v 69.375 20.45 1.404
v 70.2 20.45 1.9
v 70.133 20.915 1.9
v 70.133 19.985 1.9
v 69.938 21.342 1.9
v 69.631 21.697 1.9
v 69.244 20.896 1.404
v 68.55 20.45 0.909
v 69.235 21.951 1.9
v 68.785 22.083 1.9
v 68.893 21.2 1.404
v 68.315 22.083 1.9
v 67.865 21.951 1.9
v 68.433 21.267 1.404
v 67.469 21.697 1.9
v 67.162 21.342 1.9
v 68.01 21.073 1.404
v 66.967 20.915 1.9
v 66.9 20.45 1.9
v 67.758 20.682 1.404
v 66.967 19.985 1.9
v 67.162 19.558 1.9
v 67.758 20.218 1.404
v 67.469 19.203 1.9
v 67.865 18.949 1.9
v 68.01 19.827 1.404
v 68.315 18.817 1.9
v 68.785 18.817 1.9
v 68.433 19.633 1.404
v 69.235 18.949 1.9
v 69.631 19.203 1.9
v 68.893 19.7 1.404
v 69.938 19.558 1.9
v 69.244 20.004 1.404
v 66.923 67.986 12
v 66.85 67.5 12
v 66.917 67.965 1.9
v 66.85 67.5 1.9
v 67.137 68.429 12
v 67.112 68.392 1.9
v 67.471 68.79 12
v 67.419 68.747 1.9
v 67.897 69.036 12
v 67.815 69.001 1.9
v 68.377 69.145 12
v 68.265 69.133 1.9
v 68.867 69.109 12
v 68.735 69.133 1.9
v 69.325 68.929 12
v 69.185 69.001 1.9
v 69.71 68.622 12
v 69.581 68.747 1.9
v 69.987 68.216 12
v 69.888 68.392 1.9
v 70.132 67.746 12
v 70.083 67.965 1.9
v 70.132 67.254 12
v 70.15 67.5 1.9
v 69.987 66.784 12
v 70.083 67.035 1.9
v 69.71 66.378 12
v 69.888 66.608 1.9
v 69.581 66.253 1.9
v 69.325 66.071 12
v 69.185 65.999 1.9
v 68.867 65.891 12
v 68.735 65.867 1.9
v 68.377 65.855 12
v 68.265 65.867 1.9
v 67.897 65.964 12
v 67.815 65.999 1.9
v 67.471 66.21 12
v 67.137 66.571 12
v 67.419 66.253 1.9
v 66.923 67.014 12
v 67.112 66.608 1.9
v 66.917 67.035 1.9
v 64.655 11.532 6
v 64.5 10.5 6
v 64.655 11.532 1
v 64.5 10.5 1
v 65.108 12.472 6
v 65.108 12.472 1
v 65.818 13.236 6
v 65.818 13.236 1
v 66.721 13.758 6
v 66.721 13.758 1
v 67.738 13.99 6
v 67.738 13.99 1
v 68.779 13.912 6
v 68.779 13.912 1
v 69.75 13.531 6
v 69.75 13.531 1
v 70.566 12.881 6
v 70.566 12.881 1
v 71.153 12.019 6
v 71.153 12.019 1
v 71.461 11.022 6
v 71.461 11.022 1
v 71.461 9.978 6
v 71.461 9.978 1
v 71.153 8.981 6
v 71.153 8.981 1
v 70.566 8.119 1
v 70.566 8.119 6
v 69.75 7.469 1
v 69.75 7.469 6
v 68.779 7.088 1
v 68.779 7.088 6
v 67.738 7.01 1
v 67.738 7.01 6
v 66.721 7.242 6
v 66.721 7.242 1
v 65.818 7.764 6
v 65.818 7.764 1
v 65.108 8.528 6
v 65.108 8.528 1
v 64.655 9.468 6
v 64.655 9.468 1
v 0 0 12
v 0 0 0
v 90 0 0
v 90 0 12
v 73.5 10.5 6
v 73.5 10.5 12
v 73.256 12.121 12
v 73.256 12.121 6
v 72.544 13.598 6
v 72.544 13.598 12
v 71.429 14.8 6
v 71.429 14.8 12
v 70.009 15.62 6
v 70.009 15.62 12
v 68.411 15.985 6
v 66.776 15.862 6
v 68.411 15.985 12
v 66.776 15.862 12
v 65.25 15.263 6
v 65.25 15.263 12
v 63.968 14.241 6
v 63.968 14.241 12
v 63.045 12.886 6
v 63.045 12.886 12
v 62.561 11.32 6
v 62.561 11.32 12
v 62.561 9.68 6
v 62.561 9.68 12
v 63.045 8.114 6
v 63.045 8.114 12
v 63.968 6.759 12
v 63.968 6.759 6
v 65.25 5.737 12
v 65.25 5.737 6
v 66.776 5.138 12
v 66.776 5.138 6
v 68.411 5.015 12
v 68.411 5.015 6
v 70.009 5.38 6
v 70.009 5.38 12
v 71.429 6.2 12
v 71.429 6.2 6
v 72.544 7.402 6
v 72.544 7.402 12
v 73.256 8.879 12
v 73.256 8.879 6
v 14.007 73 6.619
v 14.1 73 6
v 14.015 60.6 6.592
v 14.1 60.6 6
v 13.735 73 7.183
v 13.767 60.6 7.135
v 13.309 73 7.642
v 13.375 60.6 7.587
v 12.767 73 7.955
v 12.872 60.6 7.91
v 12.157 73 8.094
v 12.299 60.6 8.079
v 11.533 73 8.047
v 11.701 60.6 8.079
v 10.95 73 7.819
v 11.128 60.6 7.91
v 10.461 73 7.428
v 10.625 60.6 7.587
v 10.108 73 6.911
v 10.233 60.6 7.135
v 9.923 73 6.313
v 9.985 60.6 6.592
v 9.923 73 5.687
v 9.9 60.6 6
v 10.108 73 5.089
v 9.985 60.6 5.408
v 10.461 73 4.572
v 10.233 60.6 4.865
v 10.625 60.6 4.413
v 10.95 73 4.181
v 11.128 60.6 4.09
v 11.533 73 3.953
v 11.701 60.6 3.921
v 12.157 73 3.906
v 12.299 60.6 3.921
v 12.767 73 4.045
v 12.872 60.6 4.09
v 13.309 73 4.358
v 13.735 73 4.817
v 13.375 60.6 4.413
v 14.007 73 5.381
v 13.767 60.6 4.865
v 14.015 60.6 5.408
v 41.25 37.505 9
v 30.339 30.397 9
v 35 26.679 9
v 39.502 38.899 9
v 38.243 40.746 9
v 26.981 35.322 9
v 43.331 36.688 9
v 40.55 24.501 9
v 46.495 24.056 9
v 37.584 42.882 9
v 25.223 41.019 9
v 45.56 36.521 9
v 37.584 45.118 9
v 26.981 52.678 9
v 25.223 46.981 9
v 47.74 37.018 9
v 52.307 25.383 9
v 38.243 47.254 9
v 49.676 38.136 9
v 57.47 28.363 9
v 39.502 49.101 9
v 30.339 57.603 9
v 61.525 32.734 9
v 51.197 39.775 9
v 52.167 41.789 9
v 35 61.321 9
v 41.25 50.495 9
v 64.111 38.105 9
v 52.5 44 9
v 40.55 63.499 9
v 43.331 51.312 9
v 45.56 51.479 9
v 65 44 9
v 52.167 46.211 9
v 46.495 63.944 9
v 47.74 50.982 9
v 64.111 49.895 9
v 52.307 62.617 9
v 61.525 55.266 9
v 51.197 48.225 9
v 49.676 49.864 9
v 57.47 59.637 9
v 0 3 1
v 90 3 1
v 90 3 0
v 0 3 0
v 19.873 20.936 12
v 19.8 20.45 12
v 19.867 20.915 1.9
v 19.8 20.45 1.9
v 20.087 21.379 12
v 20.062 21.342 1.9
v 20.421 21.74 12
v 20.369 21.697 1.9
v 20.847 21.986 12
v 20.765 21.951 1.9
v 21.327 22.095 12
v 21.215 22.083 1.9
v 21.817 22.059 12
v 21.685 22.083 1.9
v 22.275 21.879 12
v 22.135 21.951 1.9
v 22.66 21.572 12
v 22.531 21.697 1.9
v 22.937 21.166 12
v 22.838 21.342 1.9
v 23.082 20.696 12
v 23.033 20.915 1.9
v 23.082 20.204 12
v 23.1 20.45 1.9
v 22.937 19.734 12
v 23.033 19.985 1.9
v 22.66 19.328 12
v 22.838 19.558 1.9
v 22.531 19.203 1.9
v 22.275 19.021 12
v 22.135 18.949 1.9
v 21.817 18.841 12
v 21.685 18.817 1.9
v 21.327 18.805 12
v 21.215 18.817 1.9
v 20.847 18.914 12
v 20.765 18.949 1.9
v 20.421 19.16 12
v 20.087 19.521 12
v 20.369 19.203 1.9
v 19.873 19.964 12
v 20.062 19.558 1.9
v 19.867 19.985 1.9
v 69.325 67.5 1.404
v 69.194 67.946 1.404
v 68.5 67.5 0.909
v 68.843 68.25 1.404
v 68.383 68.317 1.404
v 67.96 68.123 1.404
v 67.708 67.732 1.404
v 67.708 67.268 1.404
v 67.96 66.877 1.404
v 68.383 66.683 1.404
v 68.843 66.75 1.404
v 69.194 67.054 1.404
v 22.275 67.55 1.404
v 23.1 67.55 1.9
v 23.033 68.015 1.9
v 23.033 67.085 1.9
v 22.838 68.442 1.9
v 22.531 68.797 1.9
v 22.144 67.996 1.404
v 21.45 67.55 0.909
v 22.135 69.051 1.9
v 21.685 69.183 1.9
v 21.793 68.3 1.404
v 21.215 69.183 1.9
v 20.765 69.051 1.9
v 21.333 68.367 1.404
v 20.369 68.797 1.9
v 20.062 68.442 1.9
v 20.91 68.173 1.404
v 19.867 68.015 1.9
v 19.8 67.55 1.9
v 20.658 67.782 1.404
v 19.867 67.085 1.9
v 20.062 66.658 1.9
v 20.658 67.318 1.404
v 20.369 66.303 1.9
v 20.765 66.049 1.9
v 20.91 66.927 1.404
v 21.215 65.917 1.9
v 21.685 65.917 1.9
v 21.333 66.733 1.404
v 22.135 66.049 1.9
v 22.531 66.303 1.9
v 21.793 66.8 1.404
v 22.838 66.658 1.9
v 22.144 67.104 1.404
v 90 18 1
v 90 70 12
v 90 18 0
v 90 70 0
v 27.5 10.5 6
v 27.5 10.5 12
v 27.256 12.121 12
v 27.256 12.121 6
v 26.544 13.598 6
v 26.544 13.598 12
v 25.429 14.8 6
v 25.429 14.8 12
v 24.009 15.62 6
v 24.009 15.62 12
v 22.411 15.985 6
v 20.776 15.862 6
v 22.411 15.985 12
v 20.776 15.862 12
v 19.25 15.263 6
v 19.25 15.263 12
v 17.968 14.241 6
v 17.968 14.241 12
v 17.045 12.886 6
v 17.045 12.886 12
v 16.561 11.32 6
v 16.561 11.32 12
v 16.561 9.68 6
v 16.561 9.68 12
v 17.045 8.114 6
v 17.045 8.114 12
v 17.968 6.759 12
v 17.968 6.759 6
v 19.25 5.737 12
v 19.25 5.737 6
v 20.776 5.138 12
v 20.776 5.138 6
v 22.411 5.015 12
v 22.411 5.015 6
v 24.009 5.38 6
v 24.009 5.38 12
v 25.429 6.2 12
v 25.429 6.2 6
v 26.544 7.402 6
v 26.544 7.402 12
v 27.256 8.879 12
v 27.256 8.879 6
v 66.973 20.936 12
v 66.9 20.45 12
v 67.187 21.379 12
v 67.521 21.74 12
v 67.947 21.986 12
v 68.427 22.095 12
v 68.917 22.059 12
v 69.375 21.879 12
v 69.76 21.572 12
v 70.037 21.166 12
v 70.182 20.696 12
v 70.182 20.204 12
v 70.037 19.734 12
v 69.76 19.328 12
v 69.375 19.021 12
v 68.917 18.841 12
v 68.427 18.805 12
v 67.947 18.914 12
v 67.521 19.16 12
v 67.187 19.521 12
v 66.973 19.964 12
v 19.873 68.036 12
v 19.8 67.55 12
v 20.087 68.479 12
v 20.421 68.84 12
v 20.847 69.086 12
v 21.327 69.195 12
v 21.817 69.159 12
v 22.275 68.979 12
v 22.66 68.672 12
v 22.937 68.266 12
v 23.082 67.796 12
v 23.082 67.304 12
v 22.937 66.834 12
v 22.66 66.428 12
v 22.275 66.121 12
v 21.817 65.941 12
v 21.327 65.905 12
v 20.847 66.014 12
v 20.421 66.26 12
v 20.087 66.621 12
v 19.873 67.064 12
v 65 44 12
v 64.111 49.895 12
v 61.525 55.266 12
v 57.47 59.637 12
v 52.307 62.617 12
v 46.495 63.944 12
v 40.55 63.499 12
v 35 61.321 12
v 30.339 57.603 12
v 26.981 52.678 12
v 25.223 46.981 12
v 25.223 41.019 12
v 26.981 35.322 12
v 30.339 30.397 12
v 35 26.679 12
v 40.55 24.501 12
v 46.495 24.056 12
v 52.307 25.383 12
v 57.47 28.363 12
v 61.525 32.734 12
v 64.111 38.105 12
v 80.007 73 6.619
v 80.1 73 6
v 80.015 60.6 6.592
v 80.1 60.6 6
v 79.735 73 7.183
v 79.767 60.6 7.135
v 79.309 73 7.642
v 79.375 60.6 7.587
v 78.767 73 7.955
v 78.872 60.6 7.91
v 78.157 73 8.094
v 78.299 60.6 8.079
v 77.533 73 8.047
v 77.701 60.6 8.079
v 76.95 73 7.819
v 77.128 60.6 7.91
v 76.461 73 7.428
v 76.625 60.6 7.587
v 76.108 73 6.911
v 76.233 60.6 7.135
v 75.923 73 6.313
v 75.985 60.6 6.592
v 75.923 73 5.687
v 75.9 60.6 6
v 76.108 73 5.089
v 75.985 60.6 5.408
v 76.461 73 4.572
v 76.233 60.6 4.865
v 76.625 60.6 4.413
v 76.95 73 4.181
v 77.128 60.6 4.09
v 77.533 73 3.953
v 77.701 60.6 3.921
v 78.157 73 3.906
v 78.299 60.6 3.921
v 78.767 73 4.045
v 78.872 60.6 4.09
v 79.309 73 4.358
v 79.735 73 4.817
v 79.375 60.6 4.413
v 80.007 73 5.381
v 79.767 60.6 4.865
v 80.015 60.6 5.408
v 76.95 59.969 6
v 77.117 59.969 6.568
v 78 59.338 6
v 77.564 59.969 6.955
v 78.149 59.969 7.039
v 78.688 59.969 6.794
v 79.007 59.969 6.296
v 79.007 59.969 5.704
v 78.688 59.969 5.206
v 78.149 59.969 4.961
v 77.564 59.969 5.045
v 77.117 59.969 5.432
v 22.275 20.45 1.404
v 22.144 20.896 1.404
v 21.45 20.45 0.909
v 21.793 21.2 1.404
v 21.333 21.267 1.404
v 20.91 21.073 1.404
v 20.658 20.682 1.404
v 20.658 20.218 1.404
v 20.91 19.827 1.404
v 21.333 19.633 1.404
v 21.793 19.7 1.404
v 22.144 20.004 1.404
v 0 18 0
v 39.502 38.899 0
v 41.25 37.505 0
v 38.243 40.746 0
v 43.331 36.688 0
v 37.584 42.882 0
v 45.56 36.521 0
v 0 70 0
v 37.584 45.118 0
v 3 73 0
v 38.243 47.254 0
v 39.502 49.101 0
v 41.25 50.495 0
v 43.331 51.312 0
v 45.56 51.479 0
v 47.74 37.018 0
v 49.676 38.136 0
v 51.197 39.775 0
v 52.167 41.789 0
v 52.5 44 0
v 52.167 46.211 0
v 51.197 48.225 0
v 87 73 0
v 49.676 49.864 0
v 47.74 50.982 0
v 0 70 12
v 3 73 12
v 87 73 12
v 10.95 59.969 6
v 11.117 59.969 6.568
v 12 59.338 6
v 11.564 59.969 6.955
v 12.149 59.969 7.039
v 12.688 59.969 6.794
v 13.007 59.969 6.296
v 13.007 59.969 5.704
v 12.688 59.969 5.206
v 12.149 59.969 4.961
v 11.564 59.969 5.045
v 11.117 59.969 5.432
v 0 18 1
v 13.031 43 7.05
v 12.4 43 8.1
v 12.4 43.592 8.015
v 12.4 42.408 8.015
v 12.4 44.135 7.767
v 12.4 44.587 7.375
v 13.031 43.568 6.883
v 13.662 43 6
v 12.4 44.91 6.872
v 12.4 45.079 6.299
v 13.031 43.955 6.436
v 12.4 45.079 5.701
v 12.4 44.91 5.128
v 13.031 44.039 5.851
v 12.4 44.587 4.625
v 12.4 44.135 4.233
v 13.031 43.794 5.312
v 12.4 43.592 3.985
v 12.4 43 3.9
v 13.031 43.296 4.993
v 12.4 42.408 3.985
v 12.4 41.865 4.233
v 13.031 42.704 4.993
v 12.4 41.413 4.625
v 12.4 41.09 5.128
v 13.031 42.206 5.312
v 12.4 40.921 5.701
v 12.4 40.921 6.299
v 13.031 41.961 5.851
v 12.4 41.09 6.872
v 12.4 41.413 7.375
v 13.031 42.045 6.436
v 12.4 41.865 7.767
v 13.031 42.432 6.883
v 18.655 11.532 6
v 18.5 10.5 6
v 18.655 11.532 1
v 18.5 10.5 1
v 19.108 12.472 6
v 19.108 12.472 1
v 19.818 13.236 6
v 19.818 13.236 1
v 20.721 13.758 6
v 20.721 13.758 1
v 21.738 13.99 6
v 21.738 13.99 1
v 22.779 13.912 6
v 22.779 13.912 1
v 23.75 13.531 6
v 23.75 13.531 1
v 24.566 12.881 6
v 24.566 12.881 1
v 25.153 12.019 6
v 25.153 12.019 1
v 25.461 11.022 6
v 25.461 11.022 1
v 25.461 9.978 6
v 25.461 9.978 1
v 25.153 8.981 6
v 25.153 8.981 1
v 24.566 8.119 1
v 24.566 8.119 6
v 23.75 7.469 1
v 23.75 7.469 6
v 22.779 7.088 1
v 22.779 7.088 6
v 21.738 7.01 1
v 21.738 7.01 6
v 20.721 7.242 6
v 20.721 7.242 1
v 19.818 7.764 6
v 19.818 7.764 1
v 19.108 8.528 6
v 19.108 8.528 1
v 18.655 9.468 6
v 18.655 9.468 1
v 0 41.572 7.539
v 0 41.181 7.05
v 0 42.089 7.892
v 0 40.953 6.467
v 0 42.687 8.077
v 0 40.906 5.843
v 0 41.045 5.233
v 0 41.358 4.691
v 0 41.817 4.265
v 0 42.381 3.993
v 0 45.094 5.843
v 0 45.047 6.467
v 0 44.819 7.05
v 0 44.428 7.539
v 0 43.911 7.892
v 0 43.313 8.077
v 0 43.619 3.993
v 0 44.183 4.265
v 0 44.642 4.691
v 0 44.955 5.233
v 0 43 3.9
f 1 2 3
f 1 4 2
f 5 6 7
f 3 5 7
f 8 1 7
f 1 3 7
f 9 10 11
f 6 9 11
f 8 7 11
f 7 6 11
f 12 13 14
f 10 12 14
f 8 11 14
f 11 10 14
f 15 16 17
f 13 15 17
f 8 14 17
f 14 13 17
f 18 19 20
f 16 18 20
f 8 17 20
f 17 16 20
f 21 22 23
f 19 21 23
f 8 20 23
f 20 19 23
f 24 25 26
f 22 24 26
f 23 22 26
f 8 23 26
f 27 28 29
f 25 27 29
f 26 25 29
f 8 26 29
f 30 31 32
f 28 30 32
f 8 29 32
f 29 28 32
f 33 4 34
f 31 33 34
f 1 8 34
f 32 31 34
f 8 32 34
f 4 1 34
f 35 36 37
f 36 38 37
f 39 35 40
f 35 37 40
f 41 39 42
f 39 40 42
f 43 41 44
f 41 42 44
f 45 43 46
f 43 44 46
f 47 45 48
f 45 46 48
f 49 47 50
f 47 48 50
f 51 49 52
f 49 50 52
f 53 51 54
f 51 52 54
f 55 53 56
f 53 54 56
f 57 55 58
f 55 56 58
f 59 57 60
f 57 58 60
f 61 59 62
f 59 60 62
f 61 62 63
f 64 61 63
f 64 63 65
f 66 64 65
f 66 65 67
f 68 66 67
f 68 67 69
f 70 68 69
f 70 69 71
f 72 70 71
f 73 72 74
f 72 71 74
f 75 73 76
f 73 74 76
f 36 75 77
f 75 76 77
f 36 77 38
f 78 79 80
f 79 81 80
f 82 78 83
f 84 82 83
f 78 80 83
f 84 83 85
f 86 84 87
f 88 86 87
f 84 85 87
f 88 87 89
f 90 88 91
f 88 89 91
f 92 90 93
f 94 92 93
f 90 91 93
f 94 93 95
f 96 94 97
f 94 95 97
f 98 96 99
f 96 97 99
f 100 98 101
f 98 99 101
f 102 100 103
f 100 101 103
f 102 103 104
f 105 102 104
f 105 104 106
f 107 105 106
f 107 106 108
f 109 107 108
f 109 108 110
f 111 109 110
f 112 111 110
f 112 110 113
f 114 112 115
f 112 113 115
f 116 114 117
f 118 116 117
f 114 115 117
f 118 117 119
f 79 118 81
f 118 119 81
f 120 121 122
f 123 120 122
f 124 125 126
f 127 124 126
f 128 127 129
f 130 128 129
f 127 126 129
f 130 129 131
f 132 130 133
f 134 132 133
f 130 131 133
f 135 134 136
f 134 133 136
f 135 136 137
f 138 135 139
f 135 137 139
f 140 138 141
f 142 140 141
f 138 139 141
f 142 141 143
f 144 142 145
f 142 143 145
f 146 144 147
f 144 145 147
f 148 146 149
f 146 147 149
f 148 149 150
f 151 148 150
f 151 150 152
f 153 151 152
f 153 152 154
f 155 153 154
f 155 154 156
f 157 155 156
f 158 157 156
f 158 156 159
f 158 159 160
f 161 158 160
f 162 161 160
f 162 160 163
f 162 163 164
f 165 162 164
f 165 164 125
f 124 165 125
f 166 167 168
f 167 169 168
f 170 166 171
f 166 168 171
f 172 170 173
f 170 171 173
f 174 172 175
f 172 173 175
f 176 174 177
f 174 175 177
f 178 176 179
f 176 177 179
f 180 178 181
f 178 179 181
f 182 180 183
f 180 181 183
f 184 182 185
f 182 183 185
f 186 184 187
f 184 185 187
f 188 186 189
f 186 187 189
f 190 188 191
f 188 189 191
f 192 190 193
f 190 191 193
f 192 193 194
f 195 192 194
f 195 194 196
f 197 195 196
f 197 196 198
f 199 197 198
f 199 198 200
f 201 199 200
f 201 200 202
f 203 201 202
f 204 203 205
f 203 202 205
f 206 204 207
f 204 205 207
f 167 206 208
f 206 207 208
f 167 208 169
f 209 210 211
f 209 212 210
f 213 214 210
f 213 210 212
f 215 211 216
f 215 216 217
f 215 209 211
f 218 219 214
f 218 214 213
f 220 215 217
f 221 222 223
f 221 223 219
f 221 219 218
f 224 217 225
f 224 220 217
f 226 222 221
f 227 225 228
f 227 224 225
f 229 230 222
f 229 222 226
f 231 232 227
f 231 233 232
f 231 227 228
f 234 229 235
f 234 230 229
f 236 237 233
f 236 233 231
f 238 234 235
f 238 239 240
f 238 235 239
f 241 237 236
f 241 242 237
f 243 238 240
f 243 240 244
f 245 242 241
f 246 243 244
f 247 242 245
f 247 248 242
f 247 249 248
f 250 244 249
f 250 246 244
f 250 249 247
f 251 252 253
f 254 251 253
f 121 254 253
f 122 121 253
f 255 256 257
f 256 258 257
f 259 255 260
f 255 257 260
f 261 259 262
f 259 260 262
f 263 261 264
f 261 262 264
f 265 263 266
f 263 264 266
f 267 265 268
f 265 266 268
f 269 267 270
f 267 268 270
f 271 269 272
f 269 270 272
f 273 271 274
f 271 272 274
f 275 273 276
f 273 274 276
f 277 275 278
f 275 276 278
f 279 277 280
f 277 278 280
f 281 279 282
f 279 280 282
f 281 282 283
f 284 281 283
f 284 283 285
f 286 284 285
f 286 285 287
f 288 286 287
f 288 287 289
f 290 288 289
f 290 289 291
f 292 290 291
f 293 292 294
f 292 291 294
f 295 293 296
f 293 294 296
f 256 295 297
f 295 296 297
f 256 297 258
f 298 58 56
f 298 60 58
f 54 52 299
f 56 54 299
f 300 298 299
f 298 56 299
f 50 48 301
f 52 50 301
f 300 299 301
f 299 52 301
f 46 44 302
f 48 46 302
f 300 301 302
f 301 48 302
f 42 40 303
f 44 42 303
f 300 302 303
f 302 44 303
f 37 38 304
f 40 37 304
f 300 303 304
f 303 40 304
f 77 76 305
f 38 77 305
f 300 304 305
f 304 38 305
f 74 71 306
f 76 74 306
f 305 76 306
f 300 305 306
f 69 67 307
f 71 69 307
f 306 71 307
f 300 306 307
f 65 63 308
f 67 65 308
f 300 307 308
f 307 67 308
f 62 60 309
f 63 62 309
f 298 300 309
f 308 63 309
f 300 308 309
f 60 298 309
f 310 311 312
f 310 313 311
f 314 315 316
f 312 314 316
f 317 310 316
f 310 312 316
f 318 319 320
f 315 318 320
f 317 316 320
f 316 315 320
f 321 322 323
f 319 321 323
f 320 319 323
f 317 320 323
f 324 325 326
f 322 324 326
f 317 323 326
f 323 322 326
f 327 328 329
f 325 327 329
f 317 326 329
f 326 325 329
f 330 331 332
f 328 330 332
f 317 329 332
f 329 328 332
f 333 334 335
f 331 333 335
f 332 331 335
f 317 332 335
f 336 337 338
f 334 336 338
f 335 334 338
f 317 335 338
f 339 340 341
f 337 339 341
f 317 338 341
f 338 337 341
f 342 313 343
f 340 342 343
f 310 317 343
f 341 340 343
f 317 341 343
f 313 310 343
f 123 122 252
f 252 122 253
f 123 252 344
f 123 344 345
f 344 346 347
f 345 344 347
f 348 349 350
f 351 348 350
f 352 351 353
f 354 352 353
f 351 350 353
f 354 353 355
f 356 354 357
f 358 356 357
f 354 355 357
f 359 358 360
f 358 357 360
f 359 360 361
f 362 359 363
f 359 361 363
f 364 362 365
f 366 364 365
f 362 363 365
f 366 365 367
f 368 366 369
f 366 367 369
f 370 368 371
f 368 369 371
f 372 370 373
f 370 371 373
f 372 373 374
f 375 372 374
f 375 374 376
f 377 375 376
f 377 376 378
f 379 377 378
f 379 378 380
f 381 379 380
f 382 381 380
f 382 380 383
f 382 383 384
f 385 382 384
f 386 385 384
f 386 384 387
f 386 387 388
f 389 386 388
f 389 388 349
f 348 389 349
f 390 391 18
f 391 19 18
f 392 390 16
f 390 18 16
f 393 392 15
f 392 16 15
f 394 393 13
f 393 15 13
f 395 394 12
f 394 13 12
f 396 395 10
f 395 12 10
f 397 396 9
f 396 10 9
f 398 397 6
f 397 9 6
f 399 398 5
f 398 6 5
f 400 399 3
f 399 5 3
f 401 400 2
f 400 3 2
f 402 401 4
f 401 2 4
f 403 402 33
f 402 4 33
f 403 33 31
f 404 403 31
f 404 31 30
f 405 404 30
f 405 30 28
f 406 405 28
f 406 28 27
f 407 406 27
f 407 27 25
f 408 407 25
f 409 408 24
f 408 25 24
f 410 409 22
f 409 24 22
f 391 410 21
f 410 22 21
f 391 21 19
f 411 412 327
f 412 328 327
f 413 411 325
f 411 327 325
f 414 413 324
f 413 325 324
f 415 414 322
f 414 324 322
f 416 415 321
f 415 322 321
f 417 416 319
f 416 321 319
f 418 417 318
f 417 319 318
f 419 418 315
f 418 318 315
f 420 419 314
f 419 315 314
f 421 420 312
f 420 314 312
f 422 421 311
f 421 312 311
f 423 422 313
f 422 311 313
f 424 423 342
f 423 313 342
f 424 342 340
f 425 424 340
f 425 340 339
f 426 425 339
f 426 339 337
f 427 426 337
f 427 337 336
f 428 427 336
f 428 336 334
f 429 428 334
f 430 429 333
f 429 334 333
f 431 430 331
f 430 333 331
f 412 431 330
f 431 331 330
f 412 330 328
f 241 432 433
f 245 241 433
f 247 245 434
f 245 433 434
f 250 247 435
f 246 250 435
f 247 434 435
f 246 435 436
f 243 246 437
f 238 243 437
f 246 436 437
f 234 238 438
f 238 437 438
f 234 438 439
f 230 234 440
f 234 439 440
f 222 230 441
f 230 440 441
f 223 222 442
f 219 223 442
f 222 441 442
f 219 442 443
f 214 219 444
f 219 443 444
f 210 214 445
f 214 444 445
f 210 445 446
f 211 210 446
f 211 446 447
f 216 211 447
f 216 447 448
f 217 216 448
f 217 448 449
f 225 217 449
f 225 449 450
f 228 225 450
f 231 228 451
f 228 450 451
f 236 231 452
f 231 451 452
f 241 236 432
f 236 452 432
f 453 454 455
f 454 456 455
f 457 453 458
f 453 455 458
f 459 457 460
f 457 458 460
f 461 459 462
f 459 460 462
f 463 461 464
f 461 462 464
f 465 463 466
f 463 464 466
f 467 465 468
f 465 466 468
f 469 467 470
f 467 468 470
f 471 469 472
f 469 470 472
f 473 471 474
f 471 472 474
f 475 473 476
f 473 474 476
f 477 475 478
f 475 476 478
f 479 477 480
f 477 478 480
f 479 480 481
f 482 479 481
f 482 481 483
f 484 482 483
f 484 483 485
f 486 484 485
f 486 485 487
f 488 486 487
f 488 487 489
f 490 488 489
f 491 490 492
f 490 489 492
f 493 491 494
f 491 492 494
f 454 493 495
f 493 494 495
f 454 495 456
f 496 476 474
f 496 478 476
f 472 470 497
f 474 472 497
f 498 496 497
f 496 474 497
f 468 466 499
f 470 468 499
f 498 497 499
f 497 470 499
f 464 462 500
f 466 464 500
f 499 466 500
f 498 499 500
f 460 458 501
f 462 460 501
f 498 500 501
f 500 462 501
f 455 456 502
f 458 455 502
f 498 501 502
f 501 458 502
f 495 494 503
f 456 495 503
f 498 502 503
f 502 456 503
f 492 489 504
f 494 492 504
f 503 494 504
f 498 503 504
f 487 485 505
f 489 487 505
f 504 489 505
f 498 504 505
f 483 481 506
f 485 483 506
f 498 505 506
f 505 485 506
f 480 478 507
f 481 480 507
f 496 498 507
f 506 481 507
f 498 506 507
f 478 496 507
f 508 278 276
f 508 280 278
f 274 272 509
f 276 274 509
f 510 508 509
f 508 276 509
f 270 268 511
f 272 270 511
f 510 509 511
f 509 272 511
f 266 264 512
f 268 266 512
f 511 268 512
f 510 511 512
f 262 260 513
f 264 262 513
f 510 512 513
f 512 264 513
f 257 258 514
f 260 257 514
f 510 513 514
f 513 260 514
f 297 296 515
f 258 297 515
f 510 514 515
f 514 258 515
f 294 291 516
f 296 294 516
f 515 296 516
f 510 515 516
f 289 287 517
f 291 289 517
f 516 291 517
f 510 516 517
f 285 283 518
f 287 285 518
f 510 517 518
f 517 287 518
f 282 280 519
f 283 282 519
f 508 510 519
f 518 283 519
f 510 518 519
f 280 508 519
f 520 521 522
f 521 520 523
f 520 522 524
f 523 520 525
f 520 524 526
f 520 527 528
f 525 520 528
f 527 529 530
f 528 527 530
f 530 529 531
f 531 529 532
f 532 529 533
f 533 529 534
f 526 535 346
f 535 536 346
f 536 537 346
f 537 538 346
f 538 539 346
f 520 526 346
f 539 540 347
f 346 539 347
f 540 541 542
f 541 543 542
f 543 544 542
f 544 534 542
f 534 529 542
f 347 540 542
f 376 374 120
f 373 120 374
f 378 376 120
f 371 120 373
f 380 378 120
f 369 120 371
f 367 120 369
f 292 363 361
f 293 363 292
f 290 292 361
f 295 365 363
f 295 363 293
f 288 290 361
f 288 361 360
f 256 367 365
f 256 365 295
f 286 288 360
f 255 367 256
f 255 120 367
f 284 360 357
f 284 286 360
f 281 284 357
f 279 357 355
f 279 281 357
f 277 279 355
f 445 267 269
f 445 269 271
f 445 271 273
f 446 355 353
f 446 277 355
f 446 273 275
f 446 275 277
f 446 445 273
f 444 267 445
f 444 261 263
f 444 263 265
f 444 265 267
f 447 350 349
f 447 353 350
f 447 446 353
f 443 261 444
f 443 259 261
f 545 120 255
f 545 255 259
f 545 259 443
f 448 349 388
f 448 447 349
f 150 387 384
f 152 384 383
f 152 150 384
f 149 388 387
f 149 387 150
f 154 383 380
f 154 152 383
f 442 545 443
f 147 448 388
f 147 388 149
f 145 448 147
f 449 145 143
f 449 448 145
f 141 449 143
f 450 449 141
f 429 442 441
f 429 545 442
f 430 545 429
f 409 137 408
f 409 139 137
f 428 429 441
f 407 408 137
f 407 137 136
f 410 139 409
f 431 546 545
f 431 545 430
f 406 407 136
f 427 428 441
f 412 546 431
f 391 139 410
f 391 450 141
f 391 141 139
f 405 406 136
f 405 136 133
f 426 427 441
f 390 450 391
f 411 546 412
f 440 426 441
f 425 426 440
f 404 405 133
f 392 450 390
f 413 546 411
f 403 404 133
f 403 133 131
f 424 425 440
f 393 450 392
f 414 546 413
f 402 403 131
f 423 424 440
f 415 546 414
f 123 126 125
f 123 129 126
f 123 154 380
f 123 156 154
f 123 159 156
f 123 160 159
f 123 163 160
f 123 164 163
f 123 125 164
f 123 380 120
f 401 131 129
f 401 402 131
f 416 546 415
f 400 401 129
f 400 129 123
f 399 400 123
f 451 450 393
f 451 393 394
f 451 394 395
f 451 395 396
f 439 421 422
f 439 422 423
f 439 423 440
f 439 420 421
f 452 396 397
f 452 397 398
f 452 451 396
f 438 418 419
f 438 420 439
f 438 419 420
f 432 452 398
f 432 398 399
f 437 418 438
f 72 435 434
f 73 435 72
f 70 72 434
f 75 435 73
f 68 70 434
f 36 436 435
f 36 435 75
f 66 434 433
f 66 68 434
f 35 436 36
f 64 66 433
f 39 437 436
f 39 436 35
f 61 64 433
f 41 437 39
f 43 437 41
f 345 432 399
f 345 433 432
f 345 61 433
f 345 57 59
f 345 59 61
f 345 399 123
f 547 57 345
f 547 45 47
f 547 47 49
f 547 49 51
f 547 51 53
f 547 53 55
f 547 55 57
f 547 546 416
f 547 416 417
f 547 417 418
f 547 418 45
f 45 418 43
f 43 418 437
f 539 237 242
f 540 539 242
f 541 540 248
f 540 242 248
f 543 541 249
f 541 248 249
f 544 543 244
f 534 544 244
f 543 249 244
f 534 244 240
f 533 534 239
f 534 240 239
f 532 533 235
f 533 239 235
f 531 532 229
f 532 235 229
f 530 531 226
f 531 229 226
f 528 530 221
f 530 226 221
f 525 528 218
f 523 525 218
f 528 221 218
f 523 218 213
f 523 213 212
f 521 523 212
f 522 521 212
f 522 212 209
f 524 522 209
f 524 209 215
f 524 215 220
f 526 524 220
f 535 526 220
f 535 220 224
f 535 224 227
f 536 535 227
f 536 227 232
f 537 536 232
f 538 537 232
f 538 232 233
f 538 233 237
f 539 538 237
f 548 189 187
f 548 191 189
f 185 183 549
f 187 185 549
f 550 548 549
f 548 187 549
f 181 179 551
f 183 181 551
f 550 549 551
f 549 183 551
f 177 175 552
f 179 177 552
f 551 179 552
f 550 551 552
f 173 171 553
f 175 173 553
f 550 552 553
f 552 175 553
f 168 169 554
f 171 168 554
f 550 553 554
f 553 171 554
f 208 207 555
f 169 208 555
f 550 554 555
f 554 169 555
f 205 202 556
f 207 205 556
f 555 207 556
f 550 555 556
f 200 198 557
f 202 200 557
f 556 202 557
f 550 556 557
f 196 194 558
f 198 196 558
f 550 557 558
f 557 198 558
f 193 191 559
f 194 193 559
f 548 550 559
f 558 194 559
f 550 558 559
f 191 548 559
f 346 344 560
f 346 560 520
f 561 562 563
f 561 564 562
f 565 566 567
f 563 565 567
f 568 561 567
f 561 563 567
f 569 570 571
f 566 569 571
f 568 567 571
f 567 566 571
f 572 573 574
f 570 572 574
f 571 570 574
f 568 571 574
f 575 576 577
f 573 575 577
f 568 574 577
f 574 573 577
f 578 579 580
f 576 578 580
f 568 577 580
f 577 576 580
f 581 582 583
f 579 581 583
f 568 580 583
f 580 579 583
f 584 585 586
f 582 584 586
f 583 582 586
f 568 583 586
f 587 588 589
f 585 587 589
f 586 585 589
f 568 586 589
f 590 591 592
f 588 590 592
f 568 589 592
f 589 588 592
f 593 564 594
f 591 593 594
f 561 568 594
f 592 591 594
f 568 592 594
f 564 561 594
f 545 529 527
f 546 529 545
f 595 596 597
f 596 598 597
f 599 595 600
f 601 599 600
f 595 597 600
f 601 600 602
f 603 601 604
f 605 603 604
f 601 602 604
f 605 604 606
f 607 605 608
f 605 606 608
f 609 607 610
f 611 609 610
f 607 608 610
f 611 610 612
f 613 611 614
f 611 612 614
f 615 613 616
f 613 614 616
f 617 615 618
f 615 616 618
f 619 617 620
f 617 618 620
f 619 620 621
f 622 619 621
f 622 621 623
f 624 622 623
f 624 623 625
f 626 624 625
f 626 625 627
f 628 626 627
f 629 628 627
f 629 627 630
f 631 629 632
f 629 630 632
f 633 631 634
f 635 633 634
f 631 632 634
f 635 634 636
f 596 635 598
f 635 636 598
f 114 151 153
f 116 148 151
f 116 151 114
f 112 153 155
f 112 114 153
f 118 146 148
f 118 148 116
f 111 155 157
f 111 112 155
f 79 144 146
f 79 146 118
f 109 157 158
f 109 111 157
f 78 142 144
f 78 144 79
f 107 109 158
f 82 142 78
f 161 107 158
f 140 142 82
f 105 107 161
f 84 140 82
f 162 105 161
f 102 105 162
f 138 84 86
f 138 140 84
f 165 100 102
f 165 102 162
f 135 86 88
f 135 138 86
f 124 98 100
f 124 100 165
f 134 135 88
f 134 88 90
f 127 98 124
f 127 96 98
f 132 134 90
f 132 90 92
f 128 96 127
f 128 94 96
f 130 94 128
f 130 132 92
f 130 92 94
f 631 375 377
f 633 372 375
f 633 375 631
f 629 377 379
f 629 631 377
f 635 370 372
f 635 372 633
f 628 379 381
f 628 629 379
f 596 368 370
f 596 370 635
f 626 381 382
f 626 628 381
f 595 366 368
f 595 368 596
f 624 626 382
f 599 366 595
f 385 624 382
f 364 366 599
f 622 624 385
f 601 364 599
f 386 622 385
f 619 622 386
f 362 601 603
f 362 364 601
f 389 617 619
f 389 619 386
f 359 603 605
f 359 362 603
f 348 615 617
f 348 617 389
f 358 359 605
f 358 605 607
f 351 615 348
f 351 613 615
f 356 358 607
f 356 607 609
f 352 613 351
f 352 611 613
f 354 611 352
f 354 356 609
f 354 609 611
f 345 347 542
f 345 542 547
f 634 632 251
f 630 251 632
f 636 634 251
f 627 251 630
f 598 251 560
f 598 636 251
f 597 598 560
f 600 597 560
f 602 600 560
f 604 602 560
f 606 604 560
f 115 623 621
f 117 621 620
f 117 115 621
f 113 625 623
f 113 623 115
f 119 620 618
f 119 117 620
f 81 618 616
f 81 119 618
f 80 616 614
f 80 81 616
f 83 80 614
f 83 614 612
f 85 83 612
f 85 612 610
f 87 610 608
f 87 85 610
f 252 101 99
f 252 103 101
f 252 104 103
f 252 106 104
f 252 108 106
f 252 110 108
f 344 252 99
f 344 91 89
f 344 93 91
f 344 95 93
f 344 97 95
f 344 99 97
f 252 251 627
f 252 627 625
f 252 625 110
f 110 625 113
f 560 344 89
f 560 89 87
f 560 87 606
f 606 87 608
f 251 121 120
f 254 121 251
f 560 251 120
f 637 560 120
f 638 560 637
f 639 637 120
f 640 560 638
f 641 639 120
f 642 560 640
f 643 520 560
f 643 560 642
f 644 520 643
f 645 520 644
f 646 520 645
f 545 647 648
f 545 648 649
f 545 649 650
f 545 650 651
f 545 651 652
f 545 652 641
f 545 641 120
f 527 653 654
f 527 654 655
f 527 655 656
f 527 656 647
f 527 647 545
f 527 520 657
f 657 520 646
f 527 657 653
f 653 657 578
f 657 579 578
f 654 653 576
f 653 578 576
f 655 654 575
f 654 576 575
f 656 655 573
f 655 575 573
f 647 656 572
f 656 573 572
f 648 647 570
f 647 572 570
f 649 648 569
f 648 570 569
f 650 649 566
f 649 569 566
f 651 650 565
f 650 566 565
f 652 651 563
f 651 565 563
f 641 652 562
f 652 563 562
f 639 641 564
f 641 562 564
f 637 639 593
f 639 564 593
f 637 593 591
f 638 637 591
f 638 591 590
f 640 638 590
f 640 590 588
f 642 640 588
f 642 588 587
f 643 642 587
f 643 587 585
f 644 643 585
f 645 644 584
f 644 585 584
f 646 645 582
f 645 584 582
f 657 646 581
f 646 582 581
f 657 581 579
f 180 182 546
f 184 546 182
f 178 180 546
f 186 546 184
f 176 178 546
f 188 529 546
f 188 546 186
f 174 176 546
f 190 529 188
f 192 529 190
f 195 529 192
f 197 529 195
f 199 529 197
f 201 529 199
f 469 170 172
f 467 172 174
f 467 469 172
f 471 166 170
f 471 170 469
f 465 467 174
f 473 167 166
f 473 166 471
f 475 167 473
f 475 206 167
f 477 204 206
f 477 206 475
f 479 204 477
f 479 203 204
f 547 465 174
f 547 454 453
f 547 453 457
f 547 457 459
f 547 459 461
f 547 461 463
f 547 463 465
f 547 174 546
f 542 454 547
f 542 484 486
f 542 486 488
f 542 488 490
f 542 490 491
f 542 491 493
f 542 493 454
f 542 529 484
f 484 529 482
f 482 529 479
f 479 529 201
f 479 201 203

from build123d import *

# Parameters (mm, degrees)
SKETCH_1_W                   = 90
SKETCH_1_H                   = 73
EXTRUDE_1_DEPTH              = 12
SKETCH_2_R                   = 20
CUT_EXTRUDE_1_DEPTH          = 3
SKETCH_3_R                   = 7.5
CUT_EXTRUDE_2_DEPTH          = 117.232525568
CHAMFER_1_SIZE               = 3
SKETCH_4_W                   = 1
SKETCH_4_H                   = 15
CUT_EXTRUDE_3_DEPTH          = 117.50321884
HOLE_WIZARD_M6_1_D           = 7
HOLE_WIZARD_M6_1_CBORE_D     = 11
HOLE_WIZARD_M6_1_CBORE_DEPTH = 6
HOLE_WIZARD_M5_1_D           = 4.2
HOLE_WIZARD_M5_1_DEPTH       = 12.4
HOLE_WIZARD_M5_1_TIP         = 1.2618073
HOLE_WIZARD_M4_1_D           = 3.3
HOLE_WIZARD_M4_1_DEPTH       = 10.1
HOLE_WIZARD_M4_1_TIP         = 0.991420021
HOLE_WIZARD_M5_2_D           = 4.2
HOLE_WIZARD_M5_2_DEPTH       = 12.4
HOLE_WIZARD_M5_2_TIP         = 1.2618073


with BuildPart() as part:
    # 草图1 → 凸台-拉伸1 (new body)
    with BuildSketch(Plane.XY):
        with Locations((45, 36.5)):
            Rectangle(SKETCH_1_W, SKETCH_1_H)
    extrude(amount=EXTRUDE_1_DEPTH)

    # 草图2 → 切除-拉伸1 (cut)
    with BuildSketch(Plane.XY.offset(12)):
        with Locations((45, 44)):
            Circle(SKETCH_2_R)
    extrude(amount=-CUT_EXTRUDE_1_DEPTH, mode=Mode.SUBTRACT)

    # 草图3 → 切除-拉伸2 (cut, through all)
    with BuildSketch(Plane.XY.offset(9)):
        with Locations((45, 44)):
            Circle(SKETCH_3_R)
    extrude(amount=-CUT_EXTRUDE_2_DEPTH, mode=Mode.SUBTRACT)

    # 倒角1
    chamfer_1_edges = [part.edges().sort_by_distance(p)[0] for p in [
        (0, 73, 6),
        (90, 73, 6),
    ]]
    chamfer(chamfer_1_edges, length=CHAMFER_1_SIZE)

    # 草图4 → 切除-拉伸3 (cut, through all)
    with BuildSketch(Plane(origin=(90, 0, 0), x_dir=(0, 0, -1), z_dir=(1, 0, 0))):
        with Locations((-0.5, 10.5)):
            Rectangle(SKETCH_4_W, SKETCH_4_H)
    extrude(amount=-CUT_EXTRUDE_3_DEPTH, mode=Mode.SUBTRACT)

    # M6 六角凹头螺钉的柱形沉头孔1 (through all)
    with Locations(Plane.XY.offset(12)):
        with Locations((22, 10.5), (68, 10.5)):
            CounterBoreHole(HOLE_WIZARD_M6_1_D / 2, HOLE_WIZARD_M6_1_CBORE_D / 2, HOLE_WIZARD_M6_1_CBORE_DEPTH)

    # M5 螺纹孔1
    with Locations(Plane(origin=(0, 73, 0), x_dir=(-1, 0, 0), z_dir=(0, 1, 0))):
        with Locations((-12, 6), (-78, 6)):
            Hole(HOLE_WIZARD_M5_1_D / 2, depth=HOLE_WIZARD_M5_1_DEPTH)
            with Locations((0, 0, -(HOLE_WIZARD_M5_1_DEPTH + HOLE_WIZARD_M5_1_TIP / 2))):  # 118° drill point
                Cone(0, HOLE_WIZARD_M5_1_D / 2, HOLE_WIZARD_M5_1_TIP, mode=Mode.SUBTRACT)

    # M4 螺纹孔1
    with Locations(Plane.XY.offset(12)):
        with Locations((68.5, 67.5), (21.45, 67.55), (21.45, 20.45), (68.55, 20.45)):
            Hole(HOLE_WIZARD_M4_1_D / 2, depth=HOLE_WIZARD_M4_1_DEPTH)
            with Locations((0, 0, -(HOLE_WIZARD_M4_1_DEPTH + HOLE_WIZARD_M4_1_TIP / 2))):  # 118° drill point
                Cone(0, HOLE_WIZARD_M4_1_D / 2, HOLE_WIZARD_M4_1_TIP, mode=Mode.SUBTRACT)

    # M5 螺纹孔2
    with Locations(Plane.ZY):
        with Locations((6, 43)):
            Hole(HOLE_WIZARD_M5_2_D / 2, depth=HOLE_WIZARD_M5_2_DEPTH)
            with Locations((0, 0, -(HOLE_WIZARD_M5_2_DEPTH + HOLE_WIZARD_M5_2_TIP / 2))):  # 118° drill point
                Cone(0, HOLE_WIZARD_M5_2_D / 2, HOLE_WIZARD_M5_2_TIP, mode=Mode.SUBTRACT)


solid = part.part
